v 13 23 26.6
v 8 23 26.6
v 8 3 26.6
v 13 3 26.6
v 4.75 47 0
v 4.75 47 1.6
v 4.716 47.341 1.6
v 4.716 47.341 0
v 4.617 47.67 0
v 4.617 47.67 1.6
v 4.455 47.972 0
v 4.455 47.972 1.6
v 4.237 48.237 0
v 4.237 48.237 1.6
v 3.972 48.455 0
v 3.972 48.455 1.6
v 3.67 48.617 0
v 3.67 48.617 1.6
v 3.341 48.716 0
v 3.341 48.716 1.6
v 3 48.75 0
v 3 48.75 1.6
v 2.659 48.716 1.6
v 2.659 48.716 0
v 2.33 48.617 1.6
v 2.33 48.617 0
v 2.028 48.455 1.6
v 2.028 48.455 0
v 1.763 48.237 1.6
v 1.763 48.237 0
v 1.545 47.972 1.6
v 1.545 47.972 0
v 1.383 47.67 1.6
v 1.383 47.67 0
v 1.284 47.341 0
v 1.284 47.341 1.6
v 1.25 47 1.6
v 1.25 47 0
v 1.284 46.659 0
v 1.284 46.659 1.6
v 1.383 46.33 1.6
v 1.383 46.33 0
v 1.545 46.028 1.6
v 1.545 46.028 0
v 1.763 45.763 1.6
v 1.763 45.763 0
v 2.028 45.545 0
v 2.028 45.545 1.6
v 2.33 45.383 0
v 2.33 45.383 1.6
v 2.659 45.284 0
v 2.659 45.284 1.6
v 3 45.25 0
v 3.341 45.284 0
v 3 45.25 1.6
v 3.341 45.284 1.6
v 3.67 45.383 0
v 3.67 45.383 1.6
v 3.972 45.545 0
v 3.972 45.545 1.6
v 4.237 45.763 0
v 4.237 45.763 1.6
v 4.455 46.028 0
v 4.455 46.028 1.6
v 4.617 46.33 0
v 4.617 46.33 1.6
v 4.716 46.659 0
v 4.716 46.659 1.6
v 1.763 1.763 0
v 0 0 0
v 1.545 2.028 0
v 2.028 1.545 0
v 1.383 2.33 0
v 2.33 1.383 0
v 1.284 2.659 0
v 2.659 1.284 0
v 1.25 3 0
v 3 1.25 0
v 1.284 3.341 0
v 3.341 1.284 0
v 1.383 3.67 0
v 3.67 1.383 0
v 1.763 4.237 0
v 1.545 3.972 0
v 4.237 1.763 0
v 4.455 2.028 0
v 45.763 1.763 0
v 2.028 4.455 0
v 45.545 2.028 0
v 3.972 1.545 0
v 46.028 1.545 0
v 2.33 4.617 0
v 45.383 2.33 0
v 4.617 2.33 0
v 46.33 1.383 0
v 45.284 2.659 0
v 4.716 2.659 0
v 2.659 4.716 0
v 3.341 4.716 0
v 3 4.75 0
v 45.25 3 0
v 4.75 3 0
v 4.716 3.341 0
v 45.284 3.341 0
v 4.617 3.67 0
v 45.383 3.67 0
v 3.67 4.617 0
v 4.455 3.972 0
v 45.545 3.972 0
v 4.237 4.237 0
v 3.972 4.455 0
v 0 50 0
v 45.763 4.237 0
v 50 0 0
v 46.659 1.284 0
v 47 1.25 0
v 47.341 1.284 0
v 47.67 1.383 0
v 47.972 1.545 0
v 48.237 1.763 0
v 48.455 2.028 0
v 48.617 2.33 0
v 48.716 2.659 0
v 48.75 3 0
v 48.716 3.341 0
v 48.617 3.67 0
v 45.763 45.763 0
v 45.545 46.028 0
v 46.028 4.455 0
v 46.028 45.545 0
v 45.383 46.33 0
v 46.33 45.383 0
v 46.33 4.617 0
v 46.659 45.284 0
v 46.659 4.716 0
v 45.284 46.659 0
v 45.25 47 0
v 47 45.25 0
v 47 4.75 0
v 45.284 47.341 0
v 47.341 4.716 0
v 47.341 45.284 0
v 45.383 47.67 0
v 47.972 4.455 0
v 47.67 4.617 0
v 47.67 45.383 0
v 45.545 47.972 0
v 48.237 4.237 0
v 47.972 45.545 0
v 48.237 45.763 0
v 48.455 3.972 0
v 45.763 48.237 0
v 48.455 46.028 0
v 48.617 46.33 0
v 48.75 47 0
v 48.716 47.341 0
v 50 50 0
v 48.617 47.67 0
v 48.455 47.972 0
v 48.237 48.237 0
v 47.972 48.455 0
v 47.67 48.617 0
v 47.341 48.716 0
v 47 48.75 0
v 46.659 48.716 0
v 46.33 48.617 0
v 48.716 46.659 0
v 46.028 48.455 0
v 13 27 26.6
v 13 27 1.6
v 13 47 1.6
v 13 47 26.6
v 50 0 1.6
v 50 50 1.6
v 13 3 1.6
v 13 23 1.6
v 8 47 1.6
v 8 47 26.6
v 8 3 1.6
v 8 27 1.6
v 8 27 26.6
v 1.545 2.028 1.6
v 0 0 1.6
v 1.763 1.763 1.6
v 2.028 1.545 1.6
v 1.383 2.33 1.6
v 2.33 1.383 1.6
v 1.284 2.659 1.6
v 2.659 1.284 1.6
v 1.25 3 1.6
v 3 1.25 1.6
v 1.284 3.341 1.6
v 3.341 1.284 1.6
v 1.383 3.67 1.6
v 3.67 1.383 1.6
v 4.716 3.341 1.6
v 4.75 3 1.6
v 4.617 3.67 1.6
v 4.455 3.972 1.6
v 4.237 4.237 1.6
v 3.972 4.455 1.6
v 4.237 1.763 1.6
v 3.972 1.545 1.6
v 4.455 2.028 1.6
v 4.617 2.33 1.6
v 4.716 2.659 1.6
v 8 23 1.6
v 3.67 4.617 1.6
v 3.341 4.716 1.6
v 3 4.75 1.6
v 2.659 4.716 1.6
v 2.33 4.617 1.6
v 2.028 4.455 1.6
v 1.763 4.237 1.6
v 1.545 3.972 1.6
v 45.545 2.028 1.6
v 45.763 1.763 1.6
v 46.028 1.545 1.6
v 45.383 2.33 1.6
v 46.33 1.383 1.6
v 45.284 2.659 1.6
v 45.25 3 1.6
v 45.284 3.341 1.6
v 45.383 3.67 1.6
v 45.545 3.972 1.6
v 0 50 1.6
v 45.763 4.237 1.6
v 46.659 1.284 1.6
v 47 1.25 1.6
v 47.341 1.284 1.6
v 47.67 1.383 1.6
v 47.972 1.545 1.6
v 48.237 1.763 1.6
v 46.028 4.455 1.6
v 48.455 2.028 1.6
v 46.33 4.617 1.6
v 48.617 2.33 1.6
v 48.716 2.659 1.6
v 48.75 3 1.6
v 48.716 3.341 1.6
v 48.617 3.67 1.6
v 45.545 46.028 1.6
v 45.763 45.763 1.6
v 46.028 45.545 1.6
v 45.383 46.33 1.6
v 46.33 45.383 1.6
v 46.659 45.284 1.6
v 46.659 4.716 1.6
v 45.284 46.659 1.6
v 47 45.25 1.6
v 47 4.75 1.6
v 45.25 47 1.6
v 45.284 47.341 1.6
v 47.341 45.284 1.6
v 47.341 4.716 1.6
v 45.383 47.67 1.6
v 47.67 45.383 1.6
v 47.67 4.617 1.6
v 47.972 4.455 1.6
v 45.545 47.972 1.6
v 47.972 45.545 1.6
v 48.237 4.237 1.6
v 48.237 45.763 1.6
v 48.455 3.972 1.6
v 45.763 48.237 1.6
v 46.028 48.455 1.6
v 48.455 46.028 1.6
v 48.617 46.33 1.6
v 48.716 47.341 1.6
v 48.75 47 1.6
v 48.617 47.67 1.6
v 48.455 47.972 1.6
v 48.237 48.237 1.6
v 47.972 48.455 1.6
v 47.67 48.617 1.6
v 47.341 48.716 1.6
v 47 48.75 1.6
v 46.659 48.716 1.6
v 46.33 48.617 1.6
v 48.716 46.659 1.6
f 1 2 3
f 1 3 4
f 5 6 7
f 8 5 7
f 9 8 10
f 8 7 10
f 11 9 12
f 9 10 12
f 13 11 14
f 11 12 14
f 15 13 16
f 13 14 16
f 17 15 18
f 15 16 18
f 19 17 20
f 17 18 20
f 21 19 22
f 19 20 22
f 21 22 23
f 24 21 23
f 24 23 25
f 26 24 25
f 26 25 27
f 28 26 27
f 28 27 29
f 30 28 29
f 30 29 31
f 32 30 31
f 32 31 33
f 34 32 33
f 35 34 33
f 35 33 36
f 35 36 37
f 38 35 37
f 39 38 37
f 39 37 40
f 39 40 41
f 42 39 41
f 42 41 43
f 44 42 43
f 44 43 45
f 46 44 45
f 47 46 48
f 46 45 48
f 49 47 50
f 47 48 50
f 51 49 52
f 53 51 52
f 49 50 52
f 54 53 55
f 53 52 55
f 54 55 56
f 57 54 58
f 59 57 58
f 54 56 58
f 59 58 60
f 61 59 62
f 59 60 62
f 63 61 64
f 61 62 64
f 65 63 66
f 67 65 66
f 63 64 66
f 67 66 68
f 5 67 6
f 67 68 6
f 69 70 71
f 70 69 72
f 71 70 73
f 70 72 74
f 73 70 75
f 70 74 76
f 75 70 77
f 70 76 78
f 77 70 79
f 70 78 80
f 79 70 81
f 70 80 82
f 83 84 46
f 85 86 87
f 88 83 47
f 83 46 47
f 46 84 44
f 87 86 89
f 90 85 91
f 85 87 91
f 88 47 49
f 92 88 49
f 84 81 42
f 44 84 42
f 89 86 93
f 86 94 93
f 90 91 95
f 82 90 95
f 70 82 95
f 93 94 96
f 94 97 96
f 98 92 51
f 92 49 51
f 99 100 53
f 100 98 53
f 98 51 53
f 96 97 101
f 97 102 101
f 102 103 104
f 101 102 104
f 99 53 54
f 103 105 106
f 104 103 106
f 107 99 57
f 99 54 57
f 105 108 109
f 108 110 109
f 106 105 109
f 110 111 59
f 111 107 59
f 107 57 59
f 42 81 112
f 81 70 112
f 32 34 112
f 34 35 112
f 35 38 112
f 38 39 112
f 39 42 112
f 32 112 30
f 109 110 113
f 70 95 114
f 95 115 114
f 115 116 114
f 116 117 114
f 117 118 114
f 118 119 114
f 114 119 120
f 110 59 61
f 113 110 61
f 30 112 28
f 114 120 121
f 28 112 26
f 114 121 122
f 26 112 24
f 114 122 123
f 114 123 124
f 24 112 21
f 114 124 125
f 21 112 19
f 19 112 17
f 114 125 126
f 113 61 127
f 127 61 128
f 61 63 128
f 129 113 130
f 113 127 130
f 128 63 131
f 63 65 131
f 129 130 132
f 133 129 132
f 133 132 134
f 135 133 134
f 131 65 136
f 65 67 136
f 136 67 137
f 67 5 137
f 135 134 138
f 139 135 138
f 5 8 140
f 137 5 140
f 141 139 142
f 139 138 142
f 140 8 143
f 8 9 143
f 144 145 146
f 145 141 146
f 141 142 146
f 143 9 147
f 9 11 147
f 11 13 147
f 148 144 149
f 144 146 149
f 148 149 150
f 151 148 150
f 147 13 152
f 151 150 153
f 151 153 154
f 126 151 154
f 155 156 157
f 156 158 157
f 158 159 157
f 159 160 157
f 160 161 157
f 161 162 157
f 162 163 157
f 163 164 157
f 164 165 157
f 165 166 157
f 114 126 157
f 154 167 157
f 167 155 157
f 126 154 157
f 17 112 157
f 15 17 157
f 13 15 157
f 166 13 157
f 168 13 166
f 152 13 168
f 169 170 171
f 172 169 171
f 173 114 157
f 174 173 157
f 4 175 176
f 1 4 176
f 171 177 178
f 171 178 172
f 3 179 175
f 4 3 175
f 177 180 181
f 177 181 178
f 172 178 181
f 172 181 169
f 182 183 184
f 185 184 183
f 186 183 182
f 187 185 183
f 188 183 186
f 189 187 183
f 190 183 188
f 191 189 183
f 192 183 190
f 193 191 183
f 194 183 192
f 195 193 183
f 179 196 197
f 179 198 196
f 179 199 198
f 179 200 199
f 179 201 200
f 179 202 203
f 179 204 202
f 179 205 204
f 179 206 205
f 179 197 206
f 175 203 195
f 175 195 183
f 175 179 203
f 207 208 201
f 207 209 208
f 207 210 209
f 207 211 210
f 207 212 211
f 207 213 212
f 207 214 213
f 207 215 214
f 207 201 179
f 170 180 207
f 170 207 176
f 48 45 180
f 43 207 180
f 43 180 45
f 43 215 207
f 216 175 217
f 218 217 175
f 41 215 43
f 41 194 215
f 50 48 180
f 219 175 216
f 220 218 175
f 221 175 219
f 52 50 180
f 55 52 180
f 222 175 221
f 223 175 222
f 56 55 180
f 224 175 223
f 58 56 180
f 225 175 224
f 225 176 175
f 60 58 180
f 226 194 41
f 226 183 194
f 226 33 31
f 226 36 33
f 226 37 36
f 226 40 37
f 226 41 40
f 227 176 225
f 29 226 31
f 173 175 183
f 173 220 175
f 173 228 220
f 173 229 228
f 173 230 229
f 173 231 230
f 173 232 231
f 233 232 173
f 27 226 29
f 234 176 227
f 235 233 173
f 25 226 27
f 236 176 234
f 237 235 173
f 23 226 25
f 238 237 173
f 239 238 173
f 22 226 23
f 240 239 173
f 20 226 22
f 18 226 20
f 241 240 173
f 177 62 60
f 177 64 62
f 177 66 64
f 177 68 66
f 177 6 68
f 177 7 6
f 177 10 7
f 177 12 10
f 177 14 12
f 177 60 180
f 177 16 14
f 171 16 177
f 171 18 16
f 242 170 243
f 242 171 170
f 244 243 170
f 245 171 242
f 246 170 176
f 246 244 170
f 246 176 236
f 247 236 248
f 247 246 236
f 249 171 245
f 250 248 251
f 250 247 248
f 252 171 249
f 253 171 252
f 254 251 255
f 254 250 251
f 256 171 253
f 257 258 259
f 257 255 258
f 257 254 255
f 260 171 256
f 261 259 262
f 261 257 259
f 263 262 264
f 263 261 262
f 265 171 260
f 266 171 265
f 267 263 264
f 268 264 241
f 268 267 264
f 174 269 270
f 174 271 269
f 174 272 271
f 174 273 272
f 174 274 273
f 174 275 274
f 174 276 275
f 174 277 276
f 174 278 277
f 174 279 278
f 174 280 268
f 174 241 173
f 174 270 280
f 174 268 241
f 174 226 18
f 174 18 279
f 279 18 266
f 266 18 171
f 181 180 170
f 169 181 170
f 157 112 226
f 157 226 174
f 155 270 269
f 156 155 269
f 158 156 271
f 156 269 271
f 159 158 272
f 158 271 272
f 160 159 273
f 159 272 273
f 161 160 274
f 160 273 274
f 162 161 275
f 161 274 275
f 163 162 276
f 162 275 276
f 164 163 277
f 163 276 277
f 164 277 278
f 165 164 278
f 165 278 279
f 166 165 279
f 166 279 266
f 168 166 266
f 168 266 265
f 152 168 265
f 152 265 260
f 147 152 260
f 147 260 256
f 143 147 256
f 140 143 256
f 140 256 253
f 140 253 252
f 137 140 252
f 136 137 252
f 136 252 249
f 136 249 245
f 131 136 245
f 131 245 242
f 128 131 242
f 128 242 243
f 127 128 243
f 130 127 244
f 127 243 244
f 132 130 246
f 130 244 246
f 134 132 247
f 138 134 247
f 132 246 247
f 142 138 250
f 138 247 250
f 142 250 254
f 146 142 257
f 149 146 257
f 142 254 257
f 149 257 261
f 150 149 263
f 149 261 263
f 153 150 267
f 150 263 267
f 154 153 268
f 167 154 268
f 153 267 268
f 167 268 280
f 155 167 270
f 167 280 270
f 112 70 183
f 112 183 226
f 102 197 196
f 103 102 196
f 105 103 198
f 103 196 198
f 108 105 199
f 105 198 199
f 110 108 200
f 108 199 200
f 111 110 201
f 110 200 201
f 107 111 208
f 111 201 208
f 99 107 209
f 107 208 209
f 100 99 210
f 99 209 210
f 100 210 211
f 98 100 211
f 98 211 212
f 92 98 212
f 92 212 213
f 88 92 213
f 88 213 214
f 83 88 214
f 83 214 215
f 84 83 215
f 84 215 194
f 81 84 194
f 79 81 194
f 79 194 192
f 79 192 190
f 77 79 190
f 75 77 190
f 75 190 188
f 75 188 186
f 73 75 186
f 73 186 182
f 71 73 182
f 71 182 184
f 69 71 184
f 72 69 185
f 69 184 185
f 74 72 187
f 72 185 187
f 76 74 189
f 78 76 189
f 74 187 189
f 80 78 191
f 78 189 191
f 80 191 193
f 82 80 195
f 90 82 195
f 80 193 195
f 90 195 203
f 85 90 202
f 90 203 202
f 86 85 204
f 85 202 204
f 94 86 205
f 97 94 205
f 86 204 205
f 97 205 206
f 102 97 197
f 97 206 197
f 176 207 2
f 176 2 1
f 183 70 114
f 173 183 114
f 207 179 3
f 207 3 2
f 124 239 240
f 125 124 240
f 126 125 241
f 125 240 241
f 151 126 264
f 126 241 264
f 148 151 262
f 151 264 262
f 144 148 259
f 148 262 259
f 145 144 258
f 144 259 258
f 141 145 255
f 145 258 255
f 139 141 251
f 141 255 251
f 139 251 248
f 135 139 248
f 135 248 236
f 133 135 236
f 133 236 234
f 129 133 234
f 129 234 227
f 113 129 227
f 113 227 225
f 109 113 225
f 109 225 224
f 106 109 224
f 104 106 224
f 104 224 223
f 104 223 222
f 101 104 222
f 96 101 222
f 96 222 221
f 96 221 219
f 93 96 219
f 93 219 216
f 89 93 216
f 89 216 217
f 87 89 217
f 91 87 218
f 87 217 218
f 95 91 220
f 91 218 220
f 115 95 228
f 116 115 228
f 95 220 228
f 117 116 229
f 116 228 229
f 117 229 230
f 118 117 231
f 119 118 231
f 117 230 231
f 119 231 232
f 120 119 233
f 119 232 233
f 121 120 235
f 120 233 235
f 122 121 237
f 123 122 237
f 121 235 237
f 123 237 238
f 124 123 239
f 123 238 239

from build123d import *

# Parameters (mm, degrees)
ESQUISSE1_W                  = 50
ESQUISSE1_H                  = 50
BOSS_EXTRU_1_DEPTH           = 1.6
ESQUISSE2_R                  = 1.75
ENL_V_MAT_EXTRU_1_DEPTH      = 1
ENL_V_MAT_EXTRU_1_DEPTH_BACK = 2.6
ESQUISSE3_W                  = 5
ESQUISSE3_H                  = 20
BOSS_EXTRU_2_DEPTH           = 25


with BuildPart() as part:
    # Esquisse1 → Boss.-Extru.1 (new body)
    with BuildSketch(Plane.XY):
        with Locations((25, 25)):
            Rectangle(ESQUISSE1_W, ESQUISSE1_H)
    extrude(amount=BOSS_EXTRU_1_DEPTH)

    # Esquisse2 → Enlèv. mat.-Extru.1 (cut, two sides)
    with BuildSketch(Plane.XY.offset(1.6)) as enl_v_mat_extru_1_sk:
        with Locations((3, 3)):
            Circle(ESQUISSE2_R)
        with Locations((47, 3)):
            Circle(ESQUISSE2_R)
        with Locations((47, 47)):
            Circle(ESQUISSE2_R)
        with Locations((3, 47)):
            Circle(ESQUISSE2_R)
    extrude(amount=ENL_V_MAT_EXTRU_1_DEPTH, mode=Mode.SUBTRACT)
    extrude(enl_v_mat_extru_1_sk.sketch, amount=-ENL_V_MAT_EXTRU_1_DEPTH_BACK, mode=Mode.SUBTRACT)

    # Esquisse3 → Boss.-Extru.2 (add)
    with BuildSketch(Plane.XY.offset(1.6)):
        with Locations((10.5, 37)):
            Rectangle(ESQUISSE3_W, ESQUISSE3_H)
        with Locations((10.5, 13)):
            Rectangle(ESQUISSE3_W, ESQUISSE3_H)
    extrude(amount=BOSS_EXTRU_2_DEPTH)


solid = part.part
